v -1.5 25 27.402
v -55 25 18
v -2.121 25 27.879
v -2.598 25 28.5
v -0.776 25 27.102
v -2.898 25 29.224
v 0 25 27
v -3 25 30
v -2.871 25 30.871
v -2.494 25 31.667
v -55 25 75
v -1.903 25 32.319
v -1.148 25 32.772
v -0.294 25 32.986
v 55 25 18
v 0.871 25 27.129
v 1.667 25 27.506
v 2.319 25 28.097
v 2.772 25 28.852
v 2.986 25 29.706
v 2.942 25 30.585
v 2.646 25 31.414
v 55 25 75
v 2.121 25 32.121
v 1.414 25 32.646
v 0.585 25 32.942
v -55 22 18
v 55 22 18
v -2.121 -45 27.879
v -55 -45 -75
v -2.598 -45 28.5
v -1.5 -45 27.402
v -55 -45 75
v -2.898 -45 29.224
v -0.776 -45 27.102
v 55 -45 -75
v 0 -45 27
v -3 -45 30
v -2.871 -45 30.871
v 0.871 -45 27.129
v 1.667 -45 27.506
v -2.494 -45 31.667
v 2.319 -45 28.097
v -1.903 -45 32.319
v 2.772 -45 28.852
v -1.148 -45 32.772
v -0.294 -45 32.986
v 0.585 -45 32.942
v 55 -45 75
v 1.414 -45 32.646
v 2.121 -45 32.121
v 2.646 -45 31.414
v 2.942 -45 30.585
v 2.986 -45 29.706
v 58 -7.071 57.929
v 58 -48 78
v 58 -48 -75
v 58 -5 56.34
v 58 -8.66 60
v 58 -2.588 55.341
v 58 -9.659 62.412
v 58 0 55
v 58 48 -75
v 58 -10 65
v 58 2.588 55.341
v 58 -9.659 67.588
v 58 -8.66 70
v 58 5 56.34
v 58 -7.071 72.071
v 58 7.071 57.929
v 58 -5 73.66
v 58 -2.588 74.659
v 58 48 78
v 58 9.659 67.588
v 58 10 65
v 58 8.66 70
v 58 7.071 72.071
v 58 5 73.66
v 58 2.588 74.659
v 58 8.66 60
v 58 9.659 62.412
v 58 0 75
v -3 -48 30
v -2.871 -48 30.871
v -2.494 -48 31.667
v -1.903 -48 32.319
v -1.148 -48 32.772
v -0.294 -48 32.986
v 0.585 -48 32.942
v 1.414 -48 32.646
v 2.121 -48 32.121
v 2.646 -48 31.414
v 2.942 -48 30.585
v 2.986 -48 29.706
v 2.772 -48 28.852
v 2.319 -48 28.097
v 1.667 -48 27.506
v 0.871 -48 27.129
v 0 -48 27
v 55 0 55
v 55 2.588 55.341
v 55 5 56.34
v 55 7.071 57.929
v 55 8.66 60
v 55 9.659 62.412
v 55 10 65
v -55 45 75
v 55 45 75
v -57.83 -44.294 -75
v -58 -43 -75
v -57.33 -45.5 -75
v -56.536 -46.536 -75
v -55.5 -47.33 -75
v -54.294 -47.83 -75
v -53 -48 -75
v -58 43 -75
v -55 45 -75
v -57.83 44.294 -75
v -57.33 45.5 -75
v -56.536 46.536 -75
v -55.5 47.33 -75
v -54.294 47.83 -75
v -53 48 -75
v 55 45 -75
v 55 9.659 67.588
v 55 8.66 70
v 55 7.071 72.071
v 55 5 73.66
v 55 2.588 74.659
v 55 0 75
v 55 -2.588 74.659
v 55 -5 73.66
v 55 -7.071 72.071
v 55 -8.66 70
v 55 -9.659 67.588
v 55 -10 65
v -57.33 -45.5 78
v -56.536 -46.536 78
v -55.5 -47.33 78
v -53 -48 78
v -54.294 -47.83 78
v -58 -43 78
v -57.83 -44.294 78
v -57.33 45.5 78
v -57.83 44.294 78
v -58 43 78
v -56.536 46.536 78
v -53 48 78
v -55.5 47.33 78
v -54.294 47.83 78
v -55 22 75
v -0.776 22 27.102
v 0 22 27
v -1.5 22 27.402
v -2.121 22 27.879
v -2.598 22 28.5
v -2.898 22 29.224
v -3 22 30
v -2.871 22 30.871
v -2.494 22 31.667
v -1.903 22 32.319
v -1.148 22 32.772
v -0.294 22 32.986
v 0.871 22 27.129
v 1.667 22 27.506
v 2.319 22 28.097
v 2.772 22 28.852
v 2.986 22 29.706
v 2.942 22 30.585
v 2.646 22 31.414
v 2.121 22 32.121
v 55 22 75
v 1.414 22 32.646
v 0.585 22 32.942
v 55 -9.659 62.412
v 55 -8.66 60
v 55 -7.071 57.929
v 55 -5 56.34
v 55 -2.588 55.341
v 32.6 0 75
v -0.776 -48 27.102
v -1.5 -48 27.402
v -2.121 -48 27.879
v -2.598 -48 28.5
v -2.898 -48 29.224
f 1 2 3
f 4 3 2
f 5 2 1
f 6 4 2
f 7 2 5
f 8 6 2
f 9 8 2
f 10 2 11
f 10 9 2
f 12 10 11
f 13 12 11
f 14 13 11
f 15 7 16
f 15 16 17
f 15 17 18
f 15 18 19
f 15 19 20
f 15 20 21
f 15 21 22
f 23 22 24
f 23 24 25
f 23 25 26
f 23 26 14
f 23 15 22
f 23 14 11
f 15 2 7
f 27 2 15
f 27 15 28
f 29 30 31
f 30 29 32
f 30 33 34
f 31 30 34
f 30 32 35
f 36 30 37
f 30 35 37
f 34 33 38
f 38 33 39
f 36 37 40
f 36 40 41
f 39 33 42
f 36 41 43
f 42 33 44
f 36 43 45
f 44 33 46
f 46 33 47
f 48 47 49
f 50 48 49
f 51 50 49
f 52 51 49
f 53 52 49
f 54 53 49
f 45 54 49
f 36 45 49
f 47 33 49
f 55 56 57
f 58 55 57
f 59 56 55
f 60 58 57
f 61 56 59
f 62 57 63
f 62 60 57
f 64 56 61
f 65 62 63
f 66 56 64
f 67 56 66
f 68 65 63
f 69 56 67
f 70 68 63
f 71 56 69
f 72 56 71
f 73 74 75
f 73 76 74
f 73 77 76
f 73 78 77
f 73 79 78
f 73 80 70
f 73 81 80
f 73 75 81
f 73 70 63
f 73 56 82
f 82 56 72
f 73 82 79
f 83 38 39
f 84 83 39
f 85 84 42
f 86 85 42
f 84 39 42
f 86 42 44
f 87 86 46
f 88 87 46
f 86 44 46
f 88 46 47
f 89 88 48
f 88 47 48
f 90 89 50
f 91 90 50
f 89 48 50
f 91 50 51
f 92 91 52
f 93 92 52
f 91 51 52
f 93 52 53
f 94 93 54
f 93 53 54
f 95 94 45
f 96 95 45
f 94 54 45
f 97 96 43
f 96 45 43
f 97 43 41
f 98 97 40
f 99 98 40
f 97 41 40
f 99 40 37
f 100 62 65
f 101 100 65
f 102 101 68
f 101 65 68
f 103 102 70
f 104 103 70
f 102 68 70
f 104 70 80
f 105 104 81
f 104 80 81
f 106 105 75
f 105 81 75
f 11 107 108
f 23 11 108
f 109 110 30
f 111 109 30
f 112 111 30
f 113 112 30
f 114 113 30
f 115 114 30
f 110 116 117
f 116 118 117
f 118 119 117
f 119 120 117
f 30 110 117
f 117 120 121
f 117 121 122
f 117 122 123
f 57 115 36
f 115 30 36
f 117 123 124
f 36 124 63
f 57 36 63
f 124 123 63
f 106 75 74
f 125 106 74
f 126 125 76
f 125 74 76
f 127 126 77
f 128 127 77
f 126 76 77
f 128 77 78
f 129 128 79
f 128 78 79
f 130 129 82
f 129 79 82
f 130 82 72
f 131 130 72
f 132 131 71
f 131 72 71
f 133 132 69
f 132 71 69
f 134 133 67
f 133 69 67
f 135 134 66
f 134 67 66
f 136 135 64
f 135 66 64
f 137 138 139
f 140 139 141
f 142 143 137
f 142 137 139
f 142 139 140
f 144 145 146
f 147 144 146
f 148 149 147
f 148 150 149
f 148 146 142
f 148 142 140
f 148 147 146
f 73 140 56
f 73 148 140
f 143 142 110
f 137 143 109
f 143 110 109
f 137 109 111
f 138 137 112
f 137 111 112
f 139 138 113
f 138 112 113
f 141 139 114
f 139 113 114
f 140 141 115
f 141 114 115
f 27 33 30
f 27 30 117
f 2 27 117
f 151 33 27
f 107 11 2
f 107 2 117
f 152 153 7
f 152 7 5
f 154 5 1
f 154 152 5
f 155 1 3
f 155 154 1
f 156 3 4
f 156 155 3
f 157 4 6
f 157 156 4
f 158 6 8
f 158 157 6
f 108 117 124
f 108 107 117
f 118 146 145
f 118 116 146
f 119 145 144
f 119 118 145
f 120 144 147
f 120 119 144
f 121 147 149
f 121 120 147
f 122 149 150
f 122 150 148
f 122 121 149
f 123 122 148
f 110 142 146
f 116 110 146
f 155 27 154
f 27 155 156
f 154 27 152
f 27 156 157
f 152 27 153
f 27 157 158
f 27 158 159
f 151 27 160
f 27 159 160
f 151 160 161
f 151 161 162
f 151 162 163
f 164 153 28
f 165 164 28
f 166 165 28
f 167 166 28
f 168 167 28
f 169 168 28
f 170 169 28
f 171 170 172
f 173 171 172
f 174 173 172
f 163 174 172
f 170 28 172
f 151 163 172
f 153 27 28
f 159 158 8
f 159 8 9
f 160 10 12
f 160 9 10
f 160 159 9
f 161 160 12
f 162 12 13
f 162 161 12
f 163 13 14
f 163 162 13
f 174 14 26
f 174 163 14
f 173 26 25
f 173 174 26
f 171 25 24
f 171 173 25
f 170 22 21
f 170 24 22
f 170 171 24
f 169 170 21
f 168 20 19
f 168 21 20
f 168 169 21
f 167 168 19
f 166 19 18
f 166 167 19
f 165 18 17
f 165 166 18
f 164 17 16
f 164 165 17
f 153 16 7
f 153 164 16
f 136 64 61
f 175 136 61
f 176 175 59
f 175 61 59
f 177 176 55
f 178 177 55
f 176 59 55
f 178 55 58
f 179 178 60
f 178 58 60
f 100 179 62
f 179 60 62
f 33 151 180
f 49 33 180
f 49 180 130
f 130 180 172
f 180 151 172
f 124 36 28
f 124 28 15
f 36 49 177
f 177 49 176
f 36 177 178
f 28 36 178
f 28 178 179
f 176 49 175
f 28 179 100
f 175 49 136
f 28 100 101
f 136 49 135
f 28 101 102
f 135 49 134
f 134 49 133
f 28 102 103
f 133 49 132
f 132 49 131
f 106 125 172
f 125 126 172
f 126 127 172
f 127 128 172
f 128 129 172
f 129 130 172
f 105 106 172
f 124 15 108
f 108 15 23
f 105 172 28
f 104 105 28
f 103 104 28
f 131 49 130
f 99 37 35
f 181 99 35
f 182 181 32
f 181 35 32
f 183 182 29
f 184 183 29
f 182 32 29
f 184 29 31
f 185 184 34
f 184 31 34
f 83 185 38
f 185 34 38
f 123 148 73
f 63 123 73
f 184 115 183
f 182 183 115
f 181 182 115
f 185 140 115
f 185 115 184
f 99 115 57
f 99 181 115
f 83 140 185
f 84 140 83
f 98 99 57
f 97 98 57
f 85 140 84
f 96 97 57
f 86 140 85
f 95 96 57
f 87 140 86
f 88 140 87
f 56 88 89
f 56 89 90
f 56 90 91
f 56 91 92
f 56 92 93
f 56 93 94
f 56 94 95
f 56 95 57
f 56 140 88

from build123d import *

# Parameters (mm, degrees)
F0_W          = 110
F0_H          = 90
F1_DEPTH      = 75
F2_T          = 3
F4_DEPTH      = 25.4
F5_W          = 3
F5_H          = 60
F6_DEPTH      = 110
F8_DEPTH      = 76
F8_DEPTH_BACK = 88
F9_R          = 5


with BuildPart() as f1:
    # F0 (on Top) → F1 (new body, symmetric)
    with BuildSketch(Plane.XY):
        Rectangle(F0_W, F0_H)
    extrude(amount=F1_DEPTH, both=True)

    # F2
    f2_openings = [f1.faces().sort_by_distance(p)[0] for p in [
        (0, 0, -75),
    ]]
    offset(amount=F2_T, openings=f2_openings, kind=Kind.INTERSECTION)

    # F3 (on face) → F4 (cut)
    with BuildSketch(Plane.YZ.offset(58)):
        with BuildLine():
            Line((0, 55), (0, 75))
            ThreePointArc((0, 75), (-7.0710678119, 72.0710678119), (-10, 65))
            ThreePointArc((-10, 65), (-7.0710678119, 57.9289321881), (0, 55))
        make_face()
        with BuildLine():
            ThreePointArc((10, 65), (7.0710678119, 72.0710678119), (0, 75))
            Line((0, 75), (0, 55))
            ThreePointArc((0, 55), (7.0710678119, 57.9289321881), (10, 65))
        make_face()
    extrude(amount=-F4_DEPTH, mode=Mode.SUBTRACT)

    # F5 (on face) → F6 (join)
    with BuildSketch(Plane(origin=(55, 0, 0), x_dir=(0, -1, 0), z_dir=(-1, 0, 0))):
        with Locations((-23.5, 48)):
            Rectangle(F5_W, F5_H)
    extrude(amount=F6_DEPTH)

    # F7 (on face) → F8 (cut, two sides)
    with BuildSketch(Plane(origin=(0, -45, 0), x_dir=(-1, 0, 0), z_dir=(0, 1, 0))) as f8_sk:
        with BuildLine():
            ThreePointArc((3, 30), (-2.1213203436, 32.1213203436), (0, 27))
            ThreePointArc((0, 27), (2.1213203436, 27.8786796564), (3, 30))
        make_face()
    extrude(amount=-F8_DEPTH, mode=Mode.SUBTRACT)
    extrude(f8_sk.sketch, amount=F8_DEPTH_BACK, mode=Mode.SUBTRACT)

    # F9
    f9_edges = [f1.edges().sort_by_distance(p)[0] for p in [
        (-58, 48, 1.5),
        (-58, -48, 1.5),
    ]]
    fillet(f9_edges, radius=F9_R)


solid = f1.part
